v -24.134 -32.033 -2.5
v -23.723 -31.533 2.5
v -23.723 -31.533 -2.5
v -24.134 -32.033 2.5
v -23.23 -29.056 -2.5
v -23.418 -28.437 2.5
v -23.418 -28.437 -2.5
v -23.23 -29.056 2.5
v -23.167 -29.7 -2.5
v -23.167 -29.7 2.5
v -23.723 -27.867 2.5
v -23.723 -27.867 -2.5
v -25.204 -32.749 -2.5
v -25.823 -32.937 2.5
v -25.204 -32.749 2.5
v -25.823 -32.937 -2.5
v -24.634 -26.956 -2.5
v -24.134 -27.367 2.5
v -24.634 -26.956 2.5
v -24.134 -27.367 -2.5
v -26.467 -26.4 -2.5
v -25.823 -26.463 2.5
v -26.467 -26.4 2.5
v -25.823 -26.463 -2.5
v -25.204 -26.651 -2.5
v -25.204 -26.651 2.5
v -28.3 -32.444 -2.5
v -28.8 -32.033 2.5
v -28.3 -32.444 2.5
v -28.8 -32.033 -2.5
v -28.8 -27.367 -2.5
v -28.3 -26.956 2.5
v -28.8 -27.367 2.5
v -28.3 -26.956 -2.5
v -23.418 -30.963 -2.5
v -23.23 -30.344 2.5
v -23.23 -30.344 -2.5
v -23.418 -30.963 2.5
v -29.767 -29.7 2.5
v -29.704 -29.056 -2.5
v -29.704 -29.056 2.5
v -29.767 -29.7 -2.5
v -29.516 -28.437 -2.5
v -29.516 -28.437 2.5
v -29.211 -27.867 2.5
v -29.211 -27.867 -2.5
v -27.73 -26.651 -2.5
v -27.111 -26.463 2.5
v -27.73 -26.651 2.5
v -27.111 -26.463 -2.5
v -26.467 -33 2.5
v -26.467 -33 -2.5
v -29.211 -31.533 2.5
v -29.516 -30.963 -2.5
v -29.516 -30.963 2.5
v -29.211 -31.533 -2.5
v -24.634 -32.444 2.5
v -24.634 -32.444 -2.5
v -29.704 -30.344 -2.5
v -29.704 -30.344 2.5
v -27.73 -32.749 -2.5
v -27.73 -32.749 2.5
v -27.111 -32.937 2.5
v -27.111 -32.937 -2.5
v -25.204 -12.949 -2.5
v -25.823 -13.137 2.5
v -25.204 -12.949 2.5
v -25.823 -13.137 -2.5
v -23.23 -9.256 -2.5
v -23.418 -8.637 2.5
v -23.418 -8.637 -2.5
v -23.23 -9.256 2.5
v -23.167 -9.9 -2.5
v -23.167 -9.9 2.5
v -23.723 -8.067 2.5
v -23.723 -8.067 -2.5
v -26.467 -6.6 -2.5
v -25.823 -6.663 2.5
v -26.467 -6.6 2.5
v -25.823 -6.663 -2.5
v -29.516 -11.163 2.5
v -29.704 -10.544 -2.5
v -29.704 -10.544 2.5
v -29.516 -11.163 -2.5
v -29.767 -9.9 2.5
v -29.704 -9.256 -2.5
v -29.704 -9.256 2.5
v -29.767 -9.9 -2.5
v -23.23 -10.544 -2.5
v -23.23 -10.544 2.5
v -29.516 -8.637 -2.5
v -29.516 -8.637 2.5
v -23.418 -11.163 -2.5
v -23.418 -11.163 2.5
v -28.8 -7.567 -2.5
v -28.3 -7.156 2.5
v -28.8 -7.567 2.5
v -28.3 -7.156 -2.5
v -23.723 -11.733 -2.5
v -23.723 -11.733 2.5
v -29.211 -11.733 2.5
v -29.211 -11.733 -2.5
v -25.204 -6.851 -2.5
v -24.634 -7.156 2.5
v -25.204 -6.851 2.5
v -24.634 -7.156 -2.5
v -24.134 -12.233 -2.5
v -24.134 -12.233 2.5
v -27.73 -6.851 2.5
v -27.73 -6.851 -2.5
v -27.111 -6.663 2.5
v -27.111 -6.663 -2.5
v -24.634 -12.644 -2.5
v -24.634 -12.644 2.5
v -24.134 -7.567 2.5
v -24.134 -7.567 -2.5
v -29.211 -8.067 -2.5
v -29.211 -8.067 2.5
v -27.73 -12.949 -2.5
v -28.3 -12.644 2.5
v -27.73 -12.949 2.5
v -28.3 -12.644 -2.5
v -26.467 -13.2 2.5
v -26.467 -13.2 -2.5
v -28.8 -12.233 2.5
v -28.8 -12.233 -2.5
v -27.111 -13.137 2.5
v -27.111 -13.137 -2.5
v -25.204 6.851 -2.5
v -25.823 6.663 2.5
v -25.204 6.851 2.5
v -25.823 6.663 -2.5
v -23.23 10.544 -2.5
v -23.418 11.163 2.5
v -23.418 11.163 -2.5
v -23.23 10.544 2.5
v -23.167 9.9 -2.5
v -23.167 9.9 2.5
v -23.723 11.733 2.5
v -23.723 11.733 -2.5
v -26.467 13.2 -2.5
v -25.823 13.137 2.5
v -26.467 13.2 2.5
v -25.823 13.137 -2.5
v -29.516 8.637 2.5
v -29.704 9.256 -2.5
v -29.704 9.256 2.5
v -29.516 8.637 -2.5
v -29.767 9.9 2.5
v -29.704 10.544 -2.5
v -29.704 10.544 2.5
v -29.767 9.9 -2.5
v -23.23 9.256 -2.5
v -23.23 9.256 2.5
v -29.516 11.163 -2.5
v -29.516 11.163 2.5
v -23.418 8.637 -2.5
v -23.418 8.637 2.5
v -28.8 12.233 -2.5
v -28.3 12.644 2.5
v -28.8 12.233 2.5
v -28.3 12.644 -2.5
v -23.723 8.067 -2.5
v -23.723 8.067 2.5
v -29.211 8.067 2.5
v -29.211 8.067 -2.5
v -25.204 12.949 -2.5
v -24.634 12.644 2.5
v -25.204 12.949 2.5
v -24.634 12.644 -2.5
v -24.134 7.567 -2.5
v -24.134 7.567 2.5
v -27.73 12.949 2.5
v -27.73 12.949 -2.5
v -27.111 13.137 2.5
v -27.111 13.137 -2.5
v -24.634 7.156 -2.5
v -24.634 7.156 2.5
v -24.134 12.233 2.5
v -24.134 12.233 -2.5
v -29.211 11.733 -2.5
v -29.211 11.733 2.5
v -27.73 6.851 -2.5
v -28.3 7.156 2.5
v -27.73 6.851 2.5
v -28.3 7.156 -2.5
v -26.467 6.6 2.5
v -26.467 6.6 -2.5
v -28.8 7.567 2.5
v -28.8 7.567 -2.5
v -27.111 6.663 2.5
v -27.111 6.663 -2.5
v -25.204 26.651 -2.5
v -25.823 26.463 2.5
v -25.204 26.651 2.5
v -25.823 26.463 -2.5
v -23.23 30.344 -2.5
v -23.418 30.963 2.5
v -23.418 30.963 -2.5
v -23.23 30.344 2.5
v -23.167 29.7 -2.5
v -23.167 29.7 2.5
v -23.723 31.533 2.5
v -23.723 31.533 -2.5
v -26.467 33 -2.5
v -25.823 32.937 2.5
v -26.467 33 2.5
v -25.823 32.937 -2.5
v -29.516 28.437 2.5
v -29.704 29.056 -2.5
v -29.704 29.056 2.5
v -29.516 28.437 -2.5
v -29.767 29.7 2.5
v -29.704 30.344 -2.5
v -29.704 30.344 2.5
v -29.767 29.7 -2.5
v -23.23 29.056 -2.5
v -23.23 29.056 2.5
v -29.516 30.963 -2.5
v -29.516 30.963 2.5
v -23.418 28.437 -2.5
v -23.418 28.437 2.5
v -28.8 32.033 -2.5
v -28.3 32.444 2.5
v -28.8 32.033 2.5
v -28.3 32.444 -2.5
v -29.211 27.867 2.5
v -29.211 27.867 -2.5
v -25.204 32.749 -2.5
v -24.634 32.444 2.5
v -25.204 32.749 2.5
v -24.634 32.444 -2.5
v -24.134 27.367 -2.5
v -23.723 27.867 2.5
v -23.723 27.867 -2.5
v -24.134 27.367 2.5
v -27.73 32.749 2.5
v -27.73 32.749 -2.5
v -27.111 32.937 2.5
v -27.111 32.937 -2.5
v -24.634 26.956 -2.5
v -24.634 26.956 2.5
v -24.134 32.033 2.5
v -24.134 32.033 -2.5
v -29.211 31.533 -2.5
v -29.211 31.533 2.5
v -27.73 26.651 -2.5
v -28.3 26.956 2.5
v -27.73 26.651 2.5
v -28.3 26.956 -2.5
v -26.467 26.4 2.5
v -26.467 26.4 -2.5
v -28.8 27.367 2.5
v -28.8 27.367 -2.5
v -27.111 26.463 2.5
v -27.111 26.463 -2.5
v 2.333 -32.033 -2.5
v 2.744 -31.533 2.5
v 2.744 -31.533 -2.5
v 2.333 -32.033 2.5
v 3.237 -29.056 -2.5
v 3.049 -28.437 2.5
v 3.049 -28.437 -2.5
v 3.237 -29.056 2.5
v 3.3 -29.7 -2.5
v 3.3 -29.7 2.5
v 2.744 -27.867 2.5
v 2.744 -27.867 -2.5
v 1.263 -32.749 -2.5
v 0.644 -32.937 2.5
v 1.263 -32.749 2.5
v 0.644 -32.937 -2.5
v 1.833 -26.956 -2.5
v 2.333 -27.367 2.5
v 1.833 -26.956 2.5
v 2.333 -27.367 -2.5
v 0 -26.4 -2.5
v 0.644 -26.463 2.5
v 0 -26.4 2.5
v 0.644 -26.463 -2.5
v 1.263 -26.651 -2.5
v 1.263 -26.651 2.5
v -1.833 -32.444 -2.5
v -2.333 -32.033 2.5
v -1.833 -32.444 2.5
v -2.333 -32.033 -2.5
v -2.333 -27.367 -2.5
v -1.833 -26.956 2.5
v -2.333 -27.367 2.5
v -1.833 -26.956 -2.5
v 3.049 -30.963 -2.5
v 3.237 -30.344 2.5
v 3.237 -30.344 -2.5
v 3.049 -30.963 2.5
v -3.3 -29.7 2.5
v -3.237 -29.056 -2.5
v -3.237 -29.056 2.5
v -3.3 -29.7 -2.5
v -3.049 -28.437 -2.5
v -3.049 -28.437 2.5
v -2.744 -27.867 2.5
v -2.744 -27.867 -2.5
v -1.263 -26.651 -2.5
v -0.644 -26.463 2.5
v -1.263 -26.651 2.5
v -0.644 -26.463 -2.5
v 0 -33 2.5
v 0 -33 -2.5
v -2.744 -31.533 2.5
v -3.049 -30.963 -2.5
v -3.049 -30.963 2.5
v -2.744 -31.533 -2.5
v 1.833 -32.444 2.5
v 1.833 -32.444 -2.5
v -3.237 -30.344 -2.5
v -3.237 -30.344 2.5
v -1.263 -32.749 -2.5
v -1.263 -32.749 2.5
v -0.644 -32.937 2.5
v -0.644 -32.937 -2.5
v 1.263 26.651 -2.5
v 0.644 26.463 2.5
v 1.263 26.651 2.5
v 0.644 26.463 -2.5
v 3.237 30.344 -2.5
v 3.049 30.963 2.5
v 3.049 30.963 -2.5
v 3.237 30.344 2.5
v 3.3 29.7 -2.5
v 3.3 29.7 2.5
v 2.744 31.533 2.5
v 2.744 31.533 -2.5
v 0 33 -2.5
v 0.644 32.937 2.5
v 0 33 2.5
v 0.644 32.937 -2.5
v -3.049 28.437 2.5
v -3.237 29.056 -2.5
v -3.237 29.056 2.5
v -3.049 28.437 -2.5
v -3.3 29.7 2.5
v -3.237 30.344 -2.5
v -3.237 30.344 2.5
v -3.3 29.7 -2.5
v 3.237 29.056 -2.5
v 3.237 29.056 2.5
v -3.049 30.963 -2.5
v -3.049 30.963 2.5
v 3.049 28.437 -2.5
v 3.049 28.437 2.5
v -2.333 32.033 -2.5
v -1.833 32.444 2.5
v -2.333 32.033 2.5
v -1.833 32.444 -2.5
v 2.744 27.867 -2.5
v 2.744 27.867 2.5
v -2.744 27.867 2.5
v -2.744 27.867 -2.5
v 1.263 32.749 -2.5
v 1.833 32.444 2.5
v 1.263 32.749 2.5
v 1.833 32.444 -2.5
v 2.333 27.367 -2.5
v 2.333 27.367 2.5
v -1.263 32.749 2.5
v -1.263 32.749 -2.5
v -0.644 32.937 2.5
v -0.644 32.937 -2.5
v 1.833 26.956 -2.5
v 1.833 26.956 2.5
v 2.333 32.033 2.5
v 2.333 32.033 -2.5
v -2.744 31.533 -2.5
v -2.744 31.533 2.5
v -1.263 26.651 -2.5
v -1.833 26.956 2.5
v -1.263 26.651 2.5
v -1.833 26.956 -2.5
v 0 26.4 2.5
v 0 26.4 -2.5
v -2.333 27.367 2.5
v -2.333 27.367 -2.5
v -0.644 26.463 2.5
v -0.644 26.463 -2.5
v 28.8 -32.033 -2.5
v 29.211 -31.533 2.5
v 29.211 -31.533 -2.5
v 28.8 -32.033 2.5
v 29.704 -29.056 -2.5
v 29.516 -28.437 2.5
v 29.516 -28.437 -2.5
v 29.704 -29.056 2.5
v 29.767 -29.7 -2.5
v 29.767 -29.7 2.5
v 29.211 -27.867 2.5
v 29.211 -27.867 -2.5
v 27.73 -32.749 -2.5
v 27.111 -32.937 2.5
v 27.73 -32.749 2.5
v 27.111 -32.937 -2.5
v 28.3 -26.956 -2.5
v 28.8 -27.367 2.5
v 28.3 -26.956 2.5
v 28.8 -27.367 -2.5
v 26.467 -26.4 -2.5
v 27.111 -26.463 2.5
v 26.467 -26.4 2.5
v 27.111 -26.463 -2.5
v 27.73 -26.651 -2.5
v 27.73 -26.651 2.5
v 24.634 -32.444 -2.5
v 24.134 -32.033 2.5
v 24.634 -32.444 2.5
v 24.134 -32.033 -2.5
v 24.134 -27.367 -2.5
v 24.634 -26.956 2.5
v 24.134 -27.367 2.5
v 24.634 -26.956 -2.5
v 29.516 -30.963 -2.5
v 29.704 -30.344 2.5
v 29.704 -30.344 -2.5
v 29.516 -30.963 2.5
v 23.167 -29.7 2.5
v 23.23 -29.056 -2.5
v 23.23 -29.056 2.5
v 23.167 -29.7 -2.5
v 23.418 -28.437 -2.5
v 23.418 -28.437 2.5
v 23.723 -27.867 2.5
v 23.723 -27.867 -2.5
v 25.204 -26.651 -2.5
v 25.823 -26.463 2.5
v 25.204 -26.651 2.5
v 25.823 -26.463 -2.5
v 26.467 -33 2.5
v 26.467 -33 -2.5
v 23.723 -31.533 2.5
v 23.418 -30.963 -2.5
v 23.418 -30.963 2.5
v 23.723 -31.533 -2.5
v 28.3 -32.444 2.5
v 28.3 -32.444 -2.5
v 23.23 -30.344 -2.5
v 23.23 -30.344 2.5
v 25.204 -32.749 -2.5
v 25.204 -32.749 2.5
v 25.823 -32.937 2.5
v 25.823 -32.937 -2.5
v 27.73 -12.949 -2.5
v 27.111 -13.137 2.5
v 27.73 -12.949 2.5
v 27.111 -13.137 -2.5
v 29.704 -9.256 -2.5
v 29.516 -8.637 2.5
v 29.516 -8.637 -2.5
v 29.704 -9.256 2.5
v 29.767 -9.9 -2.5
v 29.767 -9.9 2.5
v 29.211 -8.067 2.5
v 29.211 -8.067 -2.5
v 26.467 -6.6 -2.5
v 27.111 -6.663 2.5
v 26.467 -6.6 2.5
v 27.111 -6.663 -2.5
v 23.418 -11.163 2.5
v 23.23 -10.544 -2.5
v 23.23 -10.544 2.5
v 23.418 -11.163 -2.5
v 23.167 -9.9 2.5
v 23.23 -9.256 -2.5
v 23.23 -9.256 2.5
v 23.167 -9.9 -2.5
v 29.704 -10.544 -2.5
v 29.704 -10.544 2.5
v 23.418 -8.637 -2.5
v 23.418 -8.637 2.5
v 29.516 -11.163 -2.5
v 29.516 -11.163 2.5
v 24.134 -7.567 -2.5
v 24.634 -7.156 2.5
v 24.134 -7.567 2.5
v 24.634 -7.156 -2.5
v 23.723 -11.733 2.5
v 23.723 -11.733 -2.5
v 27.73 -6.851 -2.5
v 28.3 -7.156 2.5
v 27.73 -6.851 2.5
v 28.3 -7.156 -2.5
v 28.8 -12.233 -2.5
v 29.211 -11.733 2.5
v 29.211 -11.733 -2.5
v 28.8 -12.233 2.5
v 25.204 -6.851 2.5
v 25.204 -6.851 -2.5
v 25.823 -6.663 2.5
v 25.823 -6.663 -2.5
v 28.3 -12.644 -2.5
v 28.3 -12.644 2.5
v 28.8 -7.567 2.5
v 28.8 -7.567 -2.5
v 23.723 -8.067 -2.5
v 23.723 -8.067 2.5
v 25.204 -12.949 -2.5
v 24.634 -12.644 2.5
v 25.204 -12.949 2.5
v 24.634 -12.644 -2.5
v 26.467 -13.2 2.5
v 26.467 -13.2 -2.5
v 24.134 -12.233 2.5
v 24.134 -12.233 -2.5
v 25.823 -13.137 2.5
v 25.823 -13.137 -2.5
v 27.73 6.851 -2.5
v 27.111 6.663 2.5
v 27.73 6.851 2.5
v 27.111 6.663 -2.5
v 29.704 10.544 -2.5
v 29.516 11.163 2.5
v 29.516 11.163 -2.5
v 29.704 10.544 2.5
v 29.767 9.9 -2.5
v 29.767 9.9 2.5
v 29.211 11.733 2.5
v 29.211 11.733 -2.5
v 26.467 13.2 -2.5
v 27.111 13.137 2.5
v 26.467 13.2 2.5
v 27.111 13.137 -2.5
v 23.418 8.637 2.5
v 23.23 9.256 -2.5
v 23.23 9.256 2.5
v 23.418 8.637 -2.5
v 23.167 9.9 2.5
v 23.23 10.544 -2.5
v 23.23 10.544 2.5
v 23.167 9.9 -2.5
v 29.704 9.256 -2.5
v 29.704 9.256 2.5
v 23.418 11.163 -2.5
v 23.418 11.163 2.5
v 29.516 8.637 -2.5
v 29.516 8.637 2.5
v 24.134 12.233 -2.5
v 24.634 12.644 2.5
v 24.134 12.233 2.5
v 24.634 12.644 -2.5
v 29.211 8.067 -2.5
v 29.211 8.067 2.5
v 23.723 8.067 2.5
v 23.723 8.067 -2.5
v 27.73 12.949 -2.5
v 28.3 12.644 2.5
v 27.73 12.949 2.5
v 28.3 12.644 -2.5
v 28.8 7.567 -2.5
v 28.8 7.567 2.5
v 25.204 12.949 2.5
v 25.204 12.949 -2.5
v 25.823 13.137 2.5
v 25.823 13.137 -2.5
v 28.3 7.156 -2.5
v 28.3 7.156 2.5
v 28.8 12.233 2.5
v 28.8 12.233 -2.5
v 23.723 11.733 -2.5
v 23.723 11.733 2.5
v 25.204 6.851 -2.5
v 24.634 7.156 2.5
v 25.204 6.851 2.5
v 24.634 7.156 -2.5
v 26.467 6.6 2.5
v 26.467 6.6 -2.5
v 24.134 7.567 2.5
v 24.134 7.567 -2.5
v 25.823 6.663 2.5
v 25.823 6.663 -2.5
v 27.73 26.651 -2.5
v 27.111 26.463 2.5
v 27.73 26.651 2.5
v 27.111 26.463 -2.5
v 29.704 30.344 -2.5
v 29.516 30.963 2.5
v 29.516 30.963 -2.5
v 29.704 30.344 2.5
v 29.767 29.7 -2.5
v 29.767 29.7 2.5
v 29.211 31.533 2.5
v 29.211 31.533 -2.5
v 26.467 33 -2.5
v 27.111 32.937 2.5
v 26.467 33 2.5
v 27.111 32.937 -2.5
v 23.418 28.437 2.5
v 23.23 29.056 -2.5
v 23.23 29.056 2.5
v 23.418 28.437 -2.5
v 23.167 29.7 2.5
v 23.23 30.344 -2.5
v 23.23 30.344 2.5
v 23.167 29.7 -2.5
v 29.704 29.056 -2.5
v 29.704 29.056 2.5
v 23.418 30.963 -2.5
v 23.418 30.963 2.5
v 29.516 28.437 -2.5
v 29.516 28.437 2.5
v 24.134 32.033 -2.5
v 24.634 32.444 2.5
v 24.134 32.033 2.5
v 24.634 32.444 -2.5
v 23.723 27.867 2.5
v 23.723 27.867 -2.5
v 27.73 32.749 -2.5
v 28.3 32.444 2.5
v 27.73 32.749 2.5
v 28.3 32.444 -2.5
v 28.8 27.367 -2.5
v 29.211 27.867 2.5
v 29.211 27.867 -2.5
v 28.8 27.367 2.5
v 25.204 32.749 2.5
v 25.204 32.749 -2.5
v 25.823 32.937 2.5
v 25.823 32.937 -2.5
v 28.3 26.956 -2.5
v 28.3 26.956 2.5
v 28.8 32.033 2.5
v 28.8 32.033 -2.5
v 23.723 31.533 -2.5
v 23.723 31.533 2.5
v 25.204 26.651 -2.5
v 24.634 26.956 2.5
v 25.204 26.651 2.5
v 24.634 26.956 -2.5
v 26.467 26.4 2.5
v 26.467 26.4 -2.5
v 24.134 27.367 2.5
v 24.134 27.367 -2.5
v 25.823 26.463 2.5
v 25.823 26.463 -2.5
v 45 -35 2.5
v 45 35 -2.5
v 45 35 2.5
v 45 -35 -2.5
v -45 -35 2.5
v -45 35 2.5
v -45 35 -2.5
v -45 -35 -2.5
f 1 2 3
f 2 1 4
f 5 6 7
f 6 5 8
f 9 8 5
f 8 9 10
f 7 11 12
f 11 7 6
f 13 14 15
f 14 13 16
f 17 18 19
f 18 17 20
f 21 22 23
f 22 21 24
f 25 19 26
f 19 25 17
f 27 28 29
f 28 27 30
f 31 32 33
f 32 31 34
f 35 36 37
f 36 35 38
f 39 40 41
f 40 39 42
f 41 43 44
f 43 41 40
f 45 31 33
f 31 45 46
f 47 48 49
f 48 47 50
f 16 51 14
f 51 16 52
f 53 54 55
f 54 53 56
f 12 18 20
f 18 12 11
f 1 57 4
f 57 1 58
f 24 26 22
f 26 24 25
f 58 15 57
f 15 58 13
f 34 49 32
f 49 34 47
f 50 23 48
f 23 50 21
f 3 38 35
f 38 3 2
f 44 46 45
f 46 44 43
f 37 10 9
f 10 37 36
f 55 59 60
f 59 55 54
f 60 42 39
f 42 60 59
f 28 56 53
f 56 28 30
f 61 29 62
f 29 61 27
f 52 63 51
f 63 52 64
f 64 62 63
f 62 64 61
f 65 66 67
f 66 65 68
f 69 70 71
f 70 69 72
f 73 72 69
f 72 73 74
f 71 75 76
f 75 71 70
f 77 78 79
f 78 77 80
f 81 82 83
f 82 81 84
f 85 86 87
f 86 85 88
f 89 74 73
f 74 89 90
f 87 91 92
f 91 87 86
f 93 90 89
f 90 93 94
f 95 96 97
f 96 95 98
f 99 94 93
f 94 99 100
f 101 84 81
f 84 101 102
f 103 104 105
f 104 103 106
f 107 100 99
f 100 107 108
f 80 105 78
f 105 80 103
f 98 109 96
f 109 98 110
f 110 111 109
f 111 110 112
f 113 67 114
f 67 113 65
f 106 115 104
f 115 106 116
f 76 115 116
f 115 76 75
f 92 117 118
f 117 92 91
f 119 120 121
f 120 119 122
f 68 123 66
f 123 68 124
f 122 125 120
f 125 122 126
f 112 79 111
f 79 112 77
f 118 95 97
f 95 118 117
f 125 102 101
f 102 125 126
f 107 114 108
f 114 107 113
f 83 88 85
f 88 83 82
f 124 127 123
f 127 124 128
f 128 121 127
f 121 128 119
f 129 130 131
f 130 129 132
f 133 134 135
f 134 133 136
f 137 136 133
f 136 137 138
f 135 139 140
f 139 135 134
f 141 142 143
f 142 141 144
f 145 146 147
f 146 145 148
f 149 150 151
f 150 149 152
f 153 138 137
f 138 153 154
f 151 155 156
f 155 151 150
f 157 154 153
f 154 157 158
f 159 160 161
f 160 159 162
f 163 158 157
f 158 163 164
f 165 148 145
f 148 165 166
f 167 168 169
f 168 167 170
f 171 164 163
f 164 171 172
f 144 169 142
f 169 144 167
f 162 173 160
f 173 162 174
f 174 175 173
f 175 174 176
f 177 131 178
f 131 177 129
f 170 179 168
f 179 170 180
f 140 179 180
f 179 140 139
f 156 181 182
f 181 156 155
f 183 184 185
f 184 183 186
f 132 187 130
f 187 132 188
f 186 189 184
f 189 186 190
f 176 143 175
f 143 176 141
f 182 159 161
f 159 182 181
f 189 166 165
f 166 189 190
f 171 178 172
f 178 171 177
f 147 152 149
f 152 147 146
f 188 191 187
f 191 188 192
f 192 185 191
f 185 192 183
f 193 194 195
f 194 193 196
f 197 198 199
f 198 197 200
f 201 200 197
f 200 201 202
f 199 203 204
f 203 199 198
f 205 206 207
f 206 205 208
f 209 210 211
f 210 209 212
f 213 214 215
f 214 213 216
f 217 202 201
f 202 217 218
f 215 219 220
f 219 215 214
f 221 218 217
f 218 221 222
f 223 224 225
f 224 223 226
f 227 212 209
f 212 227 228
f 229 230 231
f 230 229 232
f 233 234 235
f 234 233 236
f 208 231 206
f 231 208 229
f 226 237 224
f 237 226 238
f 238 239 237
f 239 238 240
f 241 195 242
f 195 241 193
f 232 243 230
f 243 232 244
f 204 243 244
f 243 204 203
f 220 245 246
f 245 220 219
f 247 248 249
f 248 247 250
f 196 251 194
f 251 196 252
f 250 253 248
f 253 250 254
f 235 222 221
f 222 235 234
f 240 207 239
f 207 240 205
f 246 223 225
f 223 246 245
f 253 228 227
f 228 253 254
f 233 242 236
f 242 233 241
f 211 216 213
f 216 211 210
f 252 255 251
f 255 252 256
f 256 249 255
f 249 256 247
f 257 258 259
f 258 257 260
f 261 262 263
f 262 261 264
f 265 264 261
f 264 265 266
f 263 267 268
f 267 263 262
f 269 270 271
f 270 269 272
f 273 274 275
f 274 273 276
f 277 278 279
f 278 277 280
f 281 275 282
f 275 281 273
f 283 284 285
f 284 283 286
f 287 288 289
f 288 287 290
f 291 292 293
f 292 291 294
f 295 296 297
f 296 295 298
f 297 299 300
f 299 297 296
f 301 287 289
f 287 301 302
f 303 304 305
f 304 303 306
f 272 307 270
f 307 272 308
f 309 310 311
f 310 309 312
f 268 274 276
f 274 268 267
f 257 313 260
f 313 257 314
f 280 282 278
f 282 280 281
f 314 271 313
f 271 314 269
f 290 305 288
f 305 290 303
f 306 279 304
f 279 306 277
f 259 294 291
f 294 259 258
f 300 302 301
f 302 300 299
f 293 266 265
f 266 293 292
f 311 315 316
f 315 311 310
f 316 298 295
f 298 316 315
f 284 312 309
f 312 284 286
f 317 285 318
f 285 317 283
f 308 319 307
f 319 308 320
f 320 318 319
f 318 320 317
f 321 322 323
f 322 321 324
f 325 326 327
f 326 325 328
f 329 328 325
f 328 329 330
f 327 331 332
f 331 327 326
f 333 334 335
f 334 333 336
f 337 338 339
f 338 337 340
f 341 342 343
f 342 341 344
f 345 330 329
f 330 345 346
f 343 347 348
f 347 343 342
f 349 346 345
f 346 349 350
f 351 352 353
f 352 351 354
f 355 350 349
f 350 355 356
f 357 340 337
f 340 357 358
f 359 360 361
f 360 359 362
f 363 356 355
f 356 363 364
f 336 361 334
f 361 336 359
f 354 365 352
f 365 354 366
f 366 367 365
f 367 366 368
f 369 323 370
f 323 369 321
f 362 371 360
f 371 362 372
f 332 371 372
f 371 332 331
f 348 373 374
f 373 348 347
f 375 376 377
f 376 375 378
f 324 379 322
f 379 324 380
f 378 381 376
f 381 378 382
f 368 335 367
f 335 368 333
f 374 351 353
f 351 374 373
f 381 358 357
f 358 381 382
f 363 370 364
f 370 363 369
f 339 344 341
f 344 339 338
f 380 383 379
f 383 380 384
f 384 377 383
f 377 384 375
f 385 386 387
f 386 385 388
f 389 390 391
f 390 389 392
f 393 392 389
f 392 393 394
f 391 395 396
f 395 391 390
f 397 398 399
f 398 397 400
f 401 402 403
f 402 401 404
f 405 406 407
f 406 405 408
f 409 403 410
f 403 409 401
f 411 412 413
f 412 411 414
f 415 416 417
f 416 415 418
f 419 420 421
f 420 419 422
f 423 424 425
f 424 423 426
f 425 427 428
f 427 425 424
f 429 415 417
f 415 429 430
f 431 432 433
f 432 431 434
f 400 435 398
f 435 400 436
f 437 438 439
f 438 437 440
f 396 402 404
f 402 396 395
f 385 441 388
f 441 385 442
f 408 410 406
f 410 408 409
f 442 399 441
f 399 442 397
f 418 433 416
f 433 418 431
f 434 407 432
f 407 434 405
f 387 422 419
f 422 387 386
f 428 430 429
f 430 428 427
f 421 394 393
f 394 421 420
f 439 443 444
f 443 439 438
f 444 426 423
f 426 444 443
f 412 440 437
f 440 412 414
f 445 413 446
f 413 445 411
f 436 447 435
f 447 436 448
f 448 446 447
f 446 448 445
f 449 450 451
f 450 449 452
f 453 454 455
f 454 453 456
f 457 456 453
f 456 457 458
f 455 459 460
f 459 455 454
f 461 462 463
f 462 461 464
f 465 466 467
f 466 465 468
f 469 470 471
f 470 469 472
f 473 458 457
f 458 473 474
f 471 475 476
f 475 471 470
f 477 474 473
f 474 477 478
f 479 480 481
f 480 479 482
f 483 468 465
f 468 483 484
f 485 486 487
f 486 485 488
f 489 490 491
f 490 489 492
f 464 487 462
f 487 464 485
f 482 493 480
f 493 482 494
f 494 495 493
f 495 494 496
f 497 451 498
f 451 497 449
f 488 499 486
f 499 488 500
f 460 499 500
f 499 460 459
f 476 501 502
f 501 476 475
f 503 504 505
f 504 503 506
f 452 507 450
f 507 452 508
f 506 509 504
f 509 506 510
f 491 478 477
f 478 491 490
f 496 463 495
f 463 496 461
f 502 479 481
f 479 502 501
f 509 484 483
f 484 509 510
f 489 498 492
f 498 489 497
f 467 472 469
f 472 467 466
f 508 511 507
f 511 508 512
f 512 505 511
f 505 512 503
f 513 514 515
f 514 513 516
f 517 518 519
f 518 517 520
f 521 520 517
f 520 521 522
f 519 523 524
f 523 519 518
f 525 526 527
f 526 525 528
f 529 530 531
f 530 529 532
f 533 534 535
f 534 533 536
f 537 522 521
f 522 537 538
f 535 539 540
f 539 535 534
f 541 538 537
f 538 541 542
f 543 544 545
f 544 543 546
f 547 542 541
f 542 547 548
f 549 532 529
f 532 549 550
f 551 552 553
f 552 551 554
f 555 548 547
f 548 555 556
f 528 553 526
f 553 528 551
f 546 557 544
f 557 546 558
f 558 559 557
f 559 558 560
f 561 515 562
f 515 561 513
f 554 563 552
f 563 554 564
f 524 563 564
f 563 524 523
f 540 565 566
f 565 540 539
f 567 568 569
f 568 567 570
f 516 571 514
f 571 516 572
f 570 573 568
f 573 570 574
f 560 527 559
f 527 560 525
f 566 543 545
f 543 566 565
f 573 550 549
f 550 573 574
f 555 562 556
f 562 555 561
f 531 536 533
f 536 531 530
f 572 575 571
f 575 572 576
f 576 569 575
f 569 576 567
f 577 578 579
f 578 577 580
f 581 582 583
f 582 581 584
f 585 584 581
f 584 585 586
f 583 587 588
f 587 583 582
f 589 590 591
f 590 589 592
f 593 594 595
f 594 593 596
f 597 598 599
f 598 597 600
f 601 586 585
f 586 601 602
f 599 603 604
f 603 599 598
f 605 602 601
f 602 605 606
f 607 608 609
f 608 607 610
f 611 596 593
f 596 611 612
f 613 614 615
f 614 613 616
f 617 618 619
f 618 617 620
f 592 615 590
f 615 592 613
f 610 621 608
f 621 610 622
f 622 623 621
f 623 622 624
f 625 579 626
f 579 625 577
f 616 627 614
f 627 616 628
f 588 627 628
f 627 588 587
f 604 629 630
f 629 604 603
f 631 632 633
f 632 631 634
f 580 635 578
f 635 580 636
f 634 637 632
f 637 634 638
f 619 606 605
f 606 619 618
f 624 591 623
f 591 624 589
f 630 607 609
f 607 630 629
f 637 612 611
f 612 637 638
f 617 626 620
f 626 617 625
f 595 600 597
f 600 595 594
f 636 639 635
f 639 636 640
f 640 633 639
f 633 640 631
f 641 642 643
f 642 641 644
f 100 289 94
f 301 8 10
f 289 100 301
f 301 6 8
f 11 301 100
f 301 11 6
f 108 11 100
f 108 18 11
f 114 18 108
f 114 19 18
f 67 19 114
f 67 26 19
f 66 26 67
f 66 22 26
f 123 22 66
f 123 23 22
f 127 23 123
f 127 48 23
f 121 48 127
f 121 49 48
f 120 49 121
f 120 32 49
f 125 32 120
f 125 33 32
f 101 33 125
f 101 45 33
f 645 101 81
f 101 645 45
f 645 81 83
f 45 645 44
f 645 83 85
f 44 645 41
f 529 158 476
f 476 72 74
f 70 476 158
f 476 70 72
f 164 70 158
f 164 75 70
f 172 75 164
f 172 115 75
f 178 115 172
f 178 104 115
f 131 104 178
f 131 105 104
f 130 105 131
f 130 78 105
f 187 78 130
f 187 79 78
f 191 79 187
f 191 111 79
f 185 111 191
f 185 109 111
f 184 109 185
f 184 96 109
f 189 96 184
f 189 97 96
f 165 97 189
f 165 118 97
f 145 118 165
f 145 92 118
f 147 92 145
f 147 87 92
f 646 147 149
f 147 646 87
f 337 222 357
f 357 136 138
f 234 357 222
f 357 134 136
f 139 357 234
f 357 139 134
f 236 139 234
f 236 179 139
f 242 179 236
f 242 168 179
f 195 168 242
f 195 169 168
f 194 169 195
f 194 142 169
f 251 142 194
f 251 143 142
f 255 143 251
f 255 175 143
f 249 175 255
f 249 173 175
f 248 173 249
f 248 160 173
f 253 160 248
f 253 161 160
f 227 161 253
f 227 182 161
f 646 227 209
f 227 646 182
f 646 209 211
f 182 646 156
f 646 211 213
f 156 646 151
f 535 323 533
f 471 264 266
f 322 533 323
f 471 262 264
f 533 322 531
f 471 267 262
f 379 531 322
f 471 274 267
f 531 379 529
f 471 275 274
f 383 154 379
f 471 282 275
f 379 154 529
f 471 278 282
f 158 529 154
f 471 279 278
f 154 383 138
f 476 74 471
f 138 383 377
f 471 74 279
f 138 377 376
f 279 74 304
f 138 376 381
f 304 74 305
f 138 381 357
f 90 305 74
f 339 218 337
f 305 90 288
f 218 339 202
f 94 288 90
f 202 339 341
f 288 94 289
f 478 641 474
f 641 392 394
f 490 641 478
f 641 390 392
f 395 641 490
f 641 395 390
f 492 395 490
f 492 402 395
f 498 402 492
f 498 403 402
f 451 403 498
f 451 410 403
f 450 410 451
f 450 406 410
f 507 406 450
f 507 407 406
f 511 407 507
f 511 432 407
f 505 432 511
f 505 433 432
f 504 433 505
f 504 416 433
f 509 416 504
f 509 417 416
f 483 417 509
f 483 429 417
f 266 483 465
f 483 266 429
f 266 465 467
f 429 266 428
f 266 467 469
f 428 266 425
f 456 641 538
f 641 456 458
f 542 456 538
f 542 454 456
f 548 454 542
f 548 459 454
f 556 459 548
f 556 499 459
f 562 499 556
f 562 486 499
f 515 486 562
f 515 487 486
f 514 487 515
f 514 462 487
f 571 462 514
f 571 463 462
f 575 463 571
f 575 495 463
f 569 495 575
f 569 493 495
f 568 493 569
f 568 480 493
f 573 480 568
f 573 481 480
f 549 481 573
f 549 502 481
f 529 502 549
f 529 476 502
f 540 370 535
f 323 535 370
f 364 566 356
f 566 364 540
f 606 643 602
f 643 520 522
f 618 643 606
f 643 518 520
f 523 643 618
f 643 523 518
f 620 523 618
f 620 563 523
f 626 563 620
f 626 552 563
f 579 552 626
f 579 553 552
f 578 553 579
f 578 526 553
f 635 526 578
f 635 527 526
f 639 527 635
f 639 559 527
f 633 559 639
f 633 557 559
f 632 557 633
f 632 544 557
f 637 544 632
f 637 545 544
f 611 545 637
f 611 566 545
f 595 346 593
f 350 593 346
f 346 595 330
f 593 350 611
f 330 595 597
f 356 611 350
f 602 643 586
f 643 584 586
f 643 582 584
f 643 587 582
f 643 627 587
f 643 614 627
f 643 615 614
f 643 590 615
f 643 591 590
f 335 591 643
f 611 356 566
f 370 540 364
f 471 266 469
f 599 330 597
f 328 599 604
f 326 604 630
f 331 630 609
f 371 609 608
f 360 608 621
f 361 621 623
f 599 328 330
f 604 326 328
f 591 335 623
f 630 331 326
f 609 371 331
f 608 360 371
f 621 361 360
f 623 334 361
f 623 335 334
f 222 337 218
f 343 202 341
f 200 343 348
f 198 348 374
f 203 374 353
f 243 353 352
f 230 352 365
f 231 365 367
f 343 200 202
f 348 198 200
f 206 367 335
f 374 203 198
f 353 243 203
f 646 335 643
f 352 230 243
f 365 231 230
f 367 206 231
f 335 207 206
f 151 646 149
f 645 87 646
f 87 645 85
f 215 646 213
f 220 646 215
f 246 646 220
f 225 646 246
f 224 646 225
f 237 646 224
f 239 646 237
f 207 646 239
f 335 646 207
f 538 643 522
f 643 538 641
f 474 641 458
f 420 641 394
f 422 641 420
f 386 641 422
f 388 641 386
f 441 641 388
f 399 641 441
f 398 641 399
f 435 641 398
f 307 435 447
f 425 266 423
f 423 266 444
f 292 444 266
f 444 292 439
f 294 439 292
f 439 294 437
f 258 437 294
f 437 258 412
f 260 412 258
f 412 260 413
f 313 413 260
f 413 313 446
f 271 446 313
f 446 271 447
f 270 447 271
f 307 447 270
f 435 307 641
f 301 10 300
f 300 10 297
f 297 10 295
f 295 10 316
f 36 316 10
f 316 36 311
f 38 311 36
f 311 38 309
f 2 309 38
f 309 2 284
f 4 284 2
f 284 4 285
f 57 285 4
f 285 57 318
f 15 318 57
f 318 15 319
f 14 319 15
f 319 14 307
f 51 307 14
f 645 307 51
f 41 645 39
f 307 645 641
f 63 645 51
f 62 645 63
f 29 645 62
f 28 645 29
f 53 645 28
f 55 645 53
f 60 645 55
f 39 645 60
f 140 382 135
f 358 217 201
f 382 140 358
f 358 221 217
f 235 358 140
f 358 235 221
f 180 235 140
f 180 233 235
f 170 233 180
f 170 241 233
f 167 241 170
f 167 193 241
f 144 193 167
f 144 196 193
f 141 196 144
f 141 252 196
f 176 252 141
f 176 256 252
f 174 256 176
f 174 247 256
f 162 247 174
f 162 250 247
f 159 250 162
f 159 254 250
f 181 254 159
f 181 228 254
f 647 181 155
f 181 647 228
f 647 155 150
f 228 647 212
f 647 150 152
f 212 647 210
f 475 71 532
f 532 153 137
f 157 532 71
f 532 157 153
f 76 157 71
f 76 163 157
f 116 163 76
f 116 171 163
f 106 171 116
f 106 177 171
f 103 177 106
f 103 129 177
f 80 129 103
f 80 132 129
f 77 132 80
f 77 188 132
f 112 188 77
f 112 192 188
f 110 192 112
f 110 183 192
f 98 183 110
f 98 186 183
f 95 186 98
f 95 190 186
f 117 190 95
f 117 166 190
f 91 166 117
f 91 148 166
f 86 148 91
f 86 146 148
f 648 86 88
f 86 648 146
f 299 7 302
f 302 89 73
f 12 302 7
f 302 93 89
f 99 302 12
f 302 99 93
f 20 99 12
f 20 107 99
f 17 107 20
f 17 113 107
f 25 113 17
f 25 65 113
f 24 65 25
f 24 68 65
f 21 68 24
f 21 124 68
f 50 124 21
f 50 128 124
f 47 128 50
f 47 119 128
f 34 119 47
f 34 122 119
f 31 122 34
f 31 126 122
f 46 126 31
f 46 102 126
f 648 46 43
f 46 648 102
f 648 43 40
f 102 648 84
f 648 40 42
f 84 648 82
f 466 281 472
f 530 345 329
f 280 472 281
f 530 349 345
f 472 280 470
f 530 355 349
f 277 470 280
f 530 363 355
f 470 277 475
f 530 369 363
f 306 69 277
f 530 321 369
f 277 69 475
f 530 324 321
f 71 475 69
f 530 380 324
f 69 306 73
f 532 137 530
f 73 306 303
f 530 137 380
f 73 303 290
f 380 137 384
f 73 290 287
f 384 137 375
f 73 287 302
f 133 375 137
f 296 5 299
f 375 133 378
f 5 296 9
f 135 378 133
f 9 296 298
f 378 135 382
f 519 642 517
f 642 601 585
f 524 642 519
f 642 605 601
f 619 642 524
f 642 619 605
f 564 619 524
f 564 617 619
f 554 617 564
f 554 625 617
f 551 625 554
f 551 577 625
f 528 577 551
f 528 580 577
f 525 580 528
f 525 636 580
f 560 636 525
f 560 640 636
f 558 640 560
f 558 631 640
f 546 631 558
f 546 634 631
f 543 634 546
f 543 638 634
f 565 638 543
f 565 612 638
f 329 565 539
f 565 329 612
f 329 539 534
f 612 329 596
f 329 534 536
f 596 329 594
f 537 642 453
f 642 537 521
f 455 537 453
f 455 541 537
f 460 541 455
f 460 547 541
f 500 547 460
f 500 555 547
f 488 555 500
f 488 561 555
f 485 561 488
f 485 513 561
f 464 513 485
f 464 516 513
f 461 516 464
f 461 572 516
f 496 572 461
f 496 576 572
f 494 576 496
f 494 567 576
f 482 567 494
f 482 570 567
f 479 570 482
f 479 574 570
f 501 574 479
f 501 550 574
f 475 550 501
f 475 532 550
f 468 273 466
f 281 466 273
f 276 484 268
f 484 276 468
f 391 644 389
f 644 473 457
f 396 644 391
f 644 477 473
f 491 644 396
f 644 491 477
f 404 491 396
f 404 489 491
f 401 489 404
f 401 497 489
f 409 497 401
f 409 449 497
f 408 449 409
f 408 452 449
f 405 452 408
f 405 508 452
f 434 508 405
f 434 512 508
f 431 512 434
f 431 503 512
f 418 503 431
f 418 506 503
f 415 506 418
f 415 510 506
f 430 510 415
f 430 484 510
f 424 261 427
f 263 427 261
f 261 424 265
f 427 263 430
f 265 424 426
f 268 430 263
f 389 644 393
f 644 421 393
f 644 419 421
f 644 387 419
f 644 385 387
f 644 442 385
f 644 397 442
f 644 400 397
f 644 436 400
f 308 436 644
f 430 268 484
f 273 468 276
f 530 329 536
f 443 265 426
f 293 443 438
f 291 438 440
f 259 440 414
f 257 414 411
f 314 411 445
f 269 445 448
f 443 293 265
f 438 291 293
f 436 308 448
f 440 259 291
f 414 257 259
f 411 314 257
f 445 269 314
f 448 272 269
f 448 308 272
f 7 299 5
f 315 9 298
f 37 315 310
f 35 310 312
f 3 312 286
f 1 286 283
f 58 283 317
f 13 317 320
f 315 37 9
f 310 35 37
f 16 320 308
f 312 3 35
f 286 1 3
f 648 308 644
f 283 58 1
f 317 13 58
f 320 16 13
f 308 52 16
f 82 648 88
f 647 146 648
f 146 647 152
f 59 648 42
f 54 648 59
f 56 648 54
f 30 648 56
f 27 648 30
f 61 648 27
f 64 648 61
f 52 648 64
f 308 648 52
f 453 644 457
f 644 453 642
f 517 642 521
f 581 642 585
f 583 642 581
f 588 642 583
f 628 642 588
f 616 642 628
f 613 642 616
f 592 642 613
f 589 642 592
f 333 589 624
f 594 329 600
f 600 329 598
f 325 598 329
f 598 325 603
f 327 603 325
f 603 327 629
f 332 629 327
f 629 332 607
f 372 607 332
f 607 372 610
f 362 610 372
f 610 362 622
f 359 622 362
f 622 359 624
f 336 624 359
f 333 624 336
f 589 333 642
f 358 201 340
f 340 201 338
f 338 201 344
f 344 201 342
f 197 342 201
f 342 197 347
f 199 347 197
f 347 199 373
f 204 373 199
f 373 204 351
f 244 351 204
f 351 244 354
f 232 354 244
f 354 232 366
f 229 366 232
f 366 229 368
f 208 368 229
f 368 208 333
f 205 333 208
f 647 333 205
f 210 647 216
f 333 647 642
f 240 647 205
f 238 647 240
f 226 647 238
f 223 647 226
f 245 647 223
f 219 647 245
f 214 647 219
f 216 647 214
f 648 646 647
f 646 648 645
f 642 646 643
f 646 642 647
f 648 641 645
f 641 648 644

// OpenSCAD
$fn = 32;

// ----------------------------------------------------------------------
// Perforated panel 90 x 70 x 5
// 4 x 3 Ø6.6 holes, frame layout
// ----------------------------------------------------------------------

// --- parameters (mm) ---
panel = [90, 70, 5];  // overall size (x, y, z)
hole_d = 6.6;         // hole diameter
pitch_x = 26.467;     // hole pitch along X
pitch_y = 19.8;       // hole pitch along Y

// --- derived feature positions (mm) ---
margin = hole_d / 2 + 2;            // = 5.3   clearance from the panel edge
cols = floor((panel[0] - 2 * margin) / pitch_x) + 1;  // = 3   how many columns fit in X
rows = floor((panel[1] - 2 * margin) / pitch_y) + 1;  // = 4   how many rows fit in Y
span_x = (cols - 1) * pitch_x + 0;  // = 52.93   width of the field
span_y = (rows - 1) * pitch_y;      // = 59.4   height of the field
origin_x = -span_x / 2;             // = -26.47   X of the first hole
origin_y = -span_y / 2;             // = -29.7   Y of the first row
holes = 2 * cols + 2 * (rows - 2);  // = 10   holes around the frame
feature_centers = [
  [origin_x + 0 * pitch_x, origin_y + 0 * pitch_y],
  [origin_x + 0 * pitch_x, origin_y + 1 * pitch_y],
  [origin_x + 0 * pitch_x, origin_y + 2 * pitch_y],
  [origin_x + 0 * pitch_x, origin_y + 3 * pitch_y],
  [origin_x + 1 * pitch_x, origin_y + 0 * pitch_y],
  [origin_x + 1 * pitch_x, origin_y + 3 * pitch_y],
  [origin_x + 2 * pitch_x, origin_y + 0 * pitch_y],
  [origin_x + 2 * pitch_x, origin_y + 1 * pitch_y],
  [origin_x + 2 * pitch_x, origin_y + 2 * pitch_y],
  [origin_x + 2 * pitch_x, origin_y + 3 * pitch_y]
];   // hole centres, used verbatim by the cutter loop

// panel outline, every hole through
difference() {
  cube(panel, center = true);
  for (centre = feature_centers)
    translate([centre[0], centre[1], 0])
      cylinder(d = hole_d, h = panel[2] + 2, center = true);
}
